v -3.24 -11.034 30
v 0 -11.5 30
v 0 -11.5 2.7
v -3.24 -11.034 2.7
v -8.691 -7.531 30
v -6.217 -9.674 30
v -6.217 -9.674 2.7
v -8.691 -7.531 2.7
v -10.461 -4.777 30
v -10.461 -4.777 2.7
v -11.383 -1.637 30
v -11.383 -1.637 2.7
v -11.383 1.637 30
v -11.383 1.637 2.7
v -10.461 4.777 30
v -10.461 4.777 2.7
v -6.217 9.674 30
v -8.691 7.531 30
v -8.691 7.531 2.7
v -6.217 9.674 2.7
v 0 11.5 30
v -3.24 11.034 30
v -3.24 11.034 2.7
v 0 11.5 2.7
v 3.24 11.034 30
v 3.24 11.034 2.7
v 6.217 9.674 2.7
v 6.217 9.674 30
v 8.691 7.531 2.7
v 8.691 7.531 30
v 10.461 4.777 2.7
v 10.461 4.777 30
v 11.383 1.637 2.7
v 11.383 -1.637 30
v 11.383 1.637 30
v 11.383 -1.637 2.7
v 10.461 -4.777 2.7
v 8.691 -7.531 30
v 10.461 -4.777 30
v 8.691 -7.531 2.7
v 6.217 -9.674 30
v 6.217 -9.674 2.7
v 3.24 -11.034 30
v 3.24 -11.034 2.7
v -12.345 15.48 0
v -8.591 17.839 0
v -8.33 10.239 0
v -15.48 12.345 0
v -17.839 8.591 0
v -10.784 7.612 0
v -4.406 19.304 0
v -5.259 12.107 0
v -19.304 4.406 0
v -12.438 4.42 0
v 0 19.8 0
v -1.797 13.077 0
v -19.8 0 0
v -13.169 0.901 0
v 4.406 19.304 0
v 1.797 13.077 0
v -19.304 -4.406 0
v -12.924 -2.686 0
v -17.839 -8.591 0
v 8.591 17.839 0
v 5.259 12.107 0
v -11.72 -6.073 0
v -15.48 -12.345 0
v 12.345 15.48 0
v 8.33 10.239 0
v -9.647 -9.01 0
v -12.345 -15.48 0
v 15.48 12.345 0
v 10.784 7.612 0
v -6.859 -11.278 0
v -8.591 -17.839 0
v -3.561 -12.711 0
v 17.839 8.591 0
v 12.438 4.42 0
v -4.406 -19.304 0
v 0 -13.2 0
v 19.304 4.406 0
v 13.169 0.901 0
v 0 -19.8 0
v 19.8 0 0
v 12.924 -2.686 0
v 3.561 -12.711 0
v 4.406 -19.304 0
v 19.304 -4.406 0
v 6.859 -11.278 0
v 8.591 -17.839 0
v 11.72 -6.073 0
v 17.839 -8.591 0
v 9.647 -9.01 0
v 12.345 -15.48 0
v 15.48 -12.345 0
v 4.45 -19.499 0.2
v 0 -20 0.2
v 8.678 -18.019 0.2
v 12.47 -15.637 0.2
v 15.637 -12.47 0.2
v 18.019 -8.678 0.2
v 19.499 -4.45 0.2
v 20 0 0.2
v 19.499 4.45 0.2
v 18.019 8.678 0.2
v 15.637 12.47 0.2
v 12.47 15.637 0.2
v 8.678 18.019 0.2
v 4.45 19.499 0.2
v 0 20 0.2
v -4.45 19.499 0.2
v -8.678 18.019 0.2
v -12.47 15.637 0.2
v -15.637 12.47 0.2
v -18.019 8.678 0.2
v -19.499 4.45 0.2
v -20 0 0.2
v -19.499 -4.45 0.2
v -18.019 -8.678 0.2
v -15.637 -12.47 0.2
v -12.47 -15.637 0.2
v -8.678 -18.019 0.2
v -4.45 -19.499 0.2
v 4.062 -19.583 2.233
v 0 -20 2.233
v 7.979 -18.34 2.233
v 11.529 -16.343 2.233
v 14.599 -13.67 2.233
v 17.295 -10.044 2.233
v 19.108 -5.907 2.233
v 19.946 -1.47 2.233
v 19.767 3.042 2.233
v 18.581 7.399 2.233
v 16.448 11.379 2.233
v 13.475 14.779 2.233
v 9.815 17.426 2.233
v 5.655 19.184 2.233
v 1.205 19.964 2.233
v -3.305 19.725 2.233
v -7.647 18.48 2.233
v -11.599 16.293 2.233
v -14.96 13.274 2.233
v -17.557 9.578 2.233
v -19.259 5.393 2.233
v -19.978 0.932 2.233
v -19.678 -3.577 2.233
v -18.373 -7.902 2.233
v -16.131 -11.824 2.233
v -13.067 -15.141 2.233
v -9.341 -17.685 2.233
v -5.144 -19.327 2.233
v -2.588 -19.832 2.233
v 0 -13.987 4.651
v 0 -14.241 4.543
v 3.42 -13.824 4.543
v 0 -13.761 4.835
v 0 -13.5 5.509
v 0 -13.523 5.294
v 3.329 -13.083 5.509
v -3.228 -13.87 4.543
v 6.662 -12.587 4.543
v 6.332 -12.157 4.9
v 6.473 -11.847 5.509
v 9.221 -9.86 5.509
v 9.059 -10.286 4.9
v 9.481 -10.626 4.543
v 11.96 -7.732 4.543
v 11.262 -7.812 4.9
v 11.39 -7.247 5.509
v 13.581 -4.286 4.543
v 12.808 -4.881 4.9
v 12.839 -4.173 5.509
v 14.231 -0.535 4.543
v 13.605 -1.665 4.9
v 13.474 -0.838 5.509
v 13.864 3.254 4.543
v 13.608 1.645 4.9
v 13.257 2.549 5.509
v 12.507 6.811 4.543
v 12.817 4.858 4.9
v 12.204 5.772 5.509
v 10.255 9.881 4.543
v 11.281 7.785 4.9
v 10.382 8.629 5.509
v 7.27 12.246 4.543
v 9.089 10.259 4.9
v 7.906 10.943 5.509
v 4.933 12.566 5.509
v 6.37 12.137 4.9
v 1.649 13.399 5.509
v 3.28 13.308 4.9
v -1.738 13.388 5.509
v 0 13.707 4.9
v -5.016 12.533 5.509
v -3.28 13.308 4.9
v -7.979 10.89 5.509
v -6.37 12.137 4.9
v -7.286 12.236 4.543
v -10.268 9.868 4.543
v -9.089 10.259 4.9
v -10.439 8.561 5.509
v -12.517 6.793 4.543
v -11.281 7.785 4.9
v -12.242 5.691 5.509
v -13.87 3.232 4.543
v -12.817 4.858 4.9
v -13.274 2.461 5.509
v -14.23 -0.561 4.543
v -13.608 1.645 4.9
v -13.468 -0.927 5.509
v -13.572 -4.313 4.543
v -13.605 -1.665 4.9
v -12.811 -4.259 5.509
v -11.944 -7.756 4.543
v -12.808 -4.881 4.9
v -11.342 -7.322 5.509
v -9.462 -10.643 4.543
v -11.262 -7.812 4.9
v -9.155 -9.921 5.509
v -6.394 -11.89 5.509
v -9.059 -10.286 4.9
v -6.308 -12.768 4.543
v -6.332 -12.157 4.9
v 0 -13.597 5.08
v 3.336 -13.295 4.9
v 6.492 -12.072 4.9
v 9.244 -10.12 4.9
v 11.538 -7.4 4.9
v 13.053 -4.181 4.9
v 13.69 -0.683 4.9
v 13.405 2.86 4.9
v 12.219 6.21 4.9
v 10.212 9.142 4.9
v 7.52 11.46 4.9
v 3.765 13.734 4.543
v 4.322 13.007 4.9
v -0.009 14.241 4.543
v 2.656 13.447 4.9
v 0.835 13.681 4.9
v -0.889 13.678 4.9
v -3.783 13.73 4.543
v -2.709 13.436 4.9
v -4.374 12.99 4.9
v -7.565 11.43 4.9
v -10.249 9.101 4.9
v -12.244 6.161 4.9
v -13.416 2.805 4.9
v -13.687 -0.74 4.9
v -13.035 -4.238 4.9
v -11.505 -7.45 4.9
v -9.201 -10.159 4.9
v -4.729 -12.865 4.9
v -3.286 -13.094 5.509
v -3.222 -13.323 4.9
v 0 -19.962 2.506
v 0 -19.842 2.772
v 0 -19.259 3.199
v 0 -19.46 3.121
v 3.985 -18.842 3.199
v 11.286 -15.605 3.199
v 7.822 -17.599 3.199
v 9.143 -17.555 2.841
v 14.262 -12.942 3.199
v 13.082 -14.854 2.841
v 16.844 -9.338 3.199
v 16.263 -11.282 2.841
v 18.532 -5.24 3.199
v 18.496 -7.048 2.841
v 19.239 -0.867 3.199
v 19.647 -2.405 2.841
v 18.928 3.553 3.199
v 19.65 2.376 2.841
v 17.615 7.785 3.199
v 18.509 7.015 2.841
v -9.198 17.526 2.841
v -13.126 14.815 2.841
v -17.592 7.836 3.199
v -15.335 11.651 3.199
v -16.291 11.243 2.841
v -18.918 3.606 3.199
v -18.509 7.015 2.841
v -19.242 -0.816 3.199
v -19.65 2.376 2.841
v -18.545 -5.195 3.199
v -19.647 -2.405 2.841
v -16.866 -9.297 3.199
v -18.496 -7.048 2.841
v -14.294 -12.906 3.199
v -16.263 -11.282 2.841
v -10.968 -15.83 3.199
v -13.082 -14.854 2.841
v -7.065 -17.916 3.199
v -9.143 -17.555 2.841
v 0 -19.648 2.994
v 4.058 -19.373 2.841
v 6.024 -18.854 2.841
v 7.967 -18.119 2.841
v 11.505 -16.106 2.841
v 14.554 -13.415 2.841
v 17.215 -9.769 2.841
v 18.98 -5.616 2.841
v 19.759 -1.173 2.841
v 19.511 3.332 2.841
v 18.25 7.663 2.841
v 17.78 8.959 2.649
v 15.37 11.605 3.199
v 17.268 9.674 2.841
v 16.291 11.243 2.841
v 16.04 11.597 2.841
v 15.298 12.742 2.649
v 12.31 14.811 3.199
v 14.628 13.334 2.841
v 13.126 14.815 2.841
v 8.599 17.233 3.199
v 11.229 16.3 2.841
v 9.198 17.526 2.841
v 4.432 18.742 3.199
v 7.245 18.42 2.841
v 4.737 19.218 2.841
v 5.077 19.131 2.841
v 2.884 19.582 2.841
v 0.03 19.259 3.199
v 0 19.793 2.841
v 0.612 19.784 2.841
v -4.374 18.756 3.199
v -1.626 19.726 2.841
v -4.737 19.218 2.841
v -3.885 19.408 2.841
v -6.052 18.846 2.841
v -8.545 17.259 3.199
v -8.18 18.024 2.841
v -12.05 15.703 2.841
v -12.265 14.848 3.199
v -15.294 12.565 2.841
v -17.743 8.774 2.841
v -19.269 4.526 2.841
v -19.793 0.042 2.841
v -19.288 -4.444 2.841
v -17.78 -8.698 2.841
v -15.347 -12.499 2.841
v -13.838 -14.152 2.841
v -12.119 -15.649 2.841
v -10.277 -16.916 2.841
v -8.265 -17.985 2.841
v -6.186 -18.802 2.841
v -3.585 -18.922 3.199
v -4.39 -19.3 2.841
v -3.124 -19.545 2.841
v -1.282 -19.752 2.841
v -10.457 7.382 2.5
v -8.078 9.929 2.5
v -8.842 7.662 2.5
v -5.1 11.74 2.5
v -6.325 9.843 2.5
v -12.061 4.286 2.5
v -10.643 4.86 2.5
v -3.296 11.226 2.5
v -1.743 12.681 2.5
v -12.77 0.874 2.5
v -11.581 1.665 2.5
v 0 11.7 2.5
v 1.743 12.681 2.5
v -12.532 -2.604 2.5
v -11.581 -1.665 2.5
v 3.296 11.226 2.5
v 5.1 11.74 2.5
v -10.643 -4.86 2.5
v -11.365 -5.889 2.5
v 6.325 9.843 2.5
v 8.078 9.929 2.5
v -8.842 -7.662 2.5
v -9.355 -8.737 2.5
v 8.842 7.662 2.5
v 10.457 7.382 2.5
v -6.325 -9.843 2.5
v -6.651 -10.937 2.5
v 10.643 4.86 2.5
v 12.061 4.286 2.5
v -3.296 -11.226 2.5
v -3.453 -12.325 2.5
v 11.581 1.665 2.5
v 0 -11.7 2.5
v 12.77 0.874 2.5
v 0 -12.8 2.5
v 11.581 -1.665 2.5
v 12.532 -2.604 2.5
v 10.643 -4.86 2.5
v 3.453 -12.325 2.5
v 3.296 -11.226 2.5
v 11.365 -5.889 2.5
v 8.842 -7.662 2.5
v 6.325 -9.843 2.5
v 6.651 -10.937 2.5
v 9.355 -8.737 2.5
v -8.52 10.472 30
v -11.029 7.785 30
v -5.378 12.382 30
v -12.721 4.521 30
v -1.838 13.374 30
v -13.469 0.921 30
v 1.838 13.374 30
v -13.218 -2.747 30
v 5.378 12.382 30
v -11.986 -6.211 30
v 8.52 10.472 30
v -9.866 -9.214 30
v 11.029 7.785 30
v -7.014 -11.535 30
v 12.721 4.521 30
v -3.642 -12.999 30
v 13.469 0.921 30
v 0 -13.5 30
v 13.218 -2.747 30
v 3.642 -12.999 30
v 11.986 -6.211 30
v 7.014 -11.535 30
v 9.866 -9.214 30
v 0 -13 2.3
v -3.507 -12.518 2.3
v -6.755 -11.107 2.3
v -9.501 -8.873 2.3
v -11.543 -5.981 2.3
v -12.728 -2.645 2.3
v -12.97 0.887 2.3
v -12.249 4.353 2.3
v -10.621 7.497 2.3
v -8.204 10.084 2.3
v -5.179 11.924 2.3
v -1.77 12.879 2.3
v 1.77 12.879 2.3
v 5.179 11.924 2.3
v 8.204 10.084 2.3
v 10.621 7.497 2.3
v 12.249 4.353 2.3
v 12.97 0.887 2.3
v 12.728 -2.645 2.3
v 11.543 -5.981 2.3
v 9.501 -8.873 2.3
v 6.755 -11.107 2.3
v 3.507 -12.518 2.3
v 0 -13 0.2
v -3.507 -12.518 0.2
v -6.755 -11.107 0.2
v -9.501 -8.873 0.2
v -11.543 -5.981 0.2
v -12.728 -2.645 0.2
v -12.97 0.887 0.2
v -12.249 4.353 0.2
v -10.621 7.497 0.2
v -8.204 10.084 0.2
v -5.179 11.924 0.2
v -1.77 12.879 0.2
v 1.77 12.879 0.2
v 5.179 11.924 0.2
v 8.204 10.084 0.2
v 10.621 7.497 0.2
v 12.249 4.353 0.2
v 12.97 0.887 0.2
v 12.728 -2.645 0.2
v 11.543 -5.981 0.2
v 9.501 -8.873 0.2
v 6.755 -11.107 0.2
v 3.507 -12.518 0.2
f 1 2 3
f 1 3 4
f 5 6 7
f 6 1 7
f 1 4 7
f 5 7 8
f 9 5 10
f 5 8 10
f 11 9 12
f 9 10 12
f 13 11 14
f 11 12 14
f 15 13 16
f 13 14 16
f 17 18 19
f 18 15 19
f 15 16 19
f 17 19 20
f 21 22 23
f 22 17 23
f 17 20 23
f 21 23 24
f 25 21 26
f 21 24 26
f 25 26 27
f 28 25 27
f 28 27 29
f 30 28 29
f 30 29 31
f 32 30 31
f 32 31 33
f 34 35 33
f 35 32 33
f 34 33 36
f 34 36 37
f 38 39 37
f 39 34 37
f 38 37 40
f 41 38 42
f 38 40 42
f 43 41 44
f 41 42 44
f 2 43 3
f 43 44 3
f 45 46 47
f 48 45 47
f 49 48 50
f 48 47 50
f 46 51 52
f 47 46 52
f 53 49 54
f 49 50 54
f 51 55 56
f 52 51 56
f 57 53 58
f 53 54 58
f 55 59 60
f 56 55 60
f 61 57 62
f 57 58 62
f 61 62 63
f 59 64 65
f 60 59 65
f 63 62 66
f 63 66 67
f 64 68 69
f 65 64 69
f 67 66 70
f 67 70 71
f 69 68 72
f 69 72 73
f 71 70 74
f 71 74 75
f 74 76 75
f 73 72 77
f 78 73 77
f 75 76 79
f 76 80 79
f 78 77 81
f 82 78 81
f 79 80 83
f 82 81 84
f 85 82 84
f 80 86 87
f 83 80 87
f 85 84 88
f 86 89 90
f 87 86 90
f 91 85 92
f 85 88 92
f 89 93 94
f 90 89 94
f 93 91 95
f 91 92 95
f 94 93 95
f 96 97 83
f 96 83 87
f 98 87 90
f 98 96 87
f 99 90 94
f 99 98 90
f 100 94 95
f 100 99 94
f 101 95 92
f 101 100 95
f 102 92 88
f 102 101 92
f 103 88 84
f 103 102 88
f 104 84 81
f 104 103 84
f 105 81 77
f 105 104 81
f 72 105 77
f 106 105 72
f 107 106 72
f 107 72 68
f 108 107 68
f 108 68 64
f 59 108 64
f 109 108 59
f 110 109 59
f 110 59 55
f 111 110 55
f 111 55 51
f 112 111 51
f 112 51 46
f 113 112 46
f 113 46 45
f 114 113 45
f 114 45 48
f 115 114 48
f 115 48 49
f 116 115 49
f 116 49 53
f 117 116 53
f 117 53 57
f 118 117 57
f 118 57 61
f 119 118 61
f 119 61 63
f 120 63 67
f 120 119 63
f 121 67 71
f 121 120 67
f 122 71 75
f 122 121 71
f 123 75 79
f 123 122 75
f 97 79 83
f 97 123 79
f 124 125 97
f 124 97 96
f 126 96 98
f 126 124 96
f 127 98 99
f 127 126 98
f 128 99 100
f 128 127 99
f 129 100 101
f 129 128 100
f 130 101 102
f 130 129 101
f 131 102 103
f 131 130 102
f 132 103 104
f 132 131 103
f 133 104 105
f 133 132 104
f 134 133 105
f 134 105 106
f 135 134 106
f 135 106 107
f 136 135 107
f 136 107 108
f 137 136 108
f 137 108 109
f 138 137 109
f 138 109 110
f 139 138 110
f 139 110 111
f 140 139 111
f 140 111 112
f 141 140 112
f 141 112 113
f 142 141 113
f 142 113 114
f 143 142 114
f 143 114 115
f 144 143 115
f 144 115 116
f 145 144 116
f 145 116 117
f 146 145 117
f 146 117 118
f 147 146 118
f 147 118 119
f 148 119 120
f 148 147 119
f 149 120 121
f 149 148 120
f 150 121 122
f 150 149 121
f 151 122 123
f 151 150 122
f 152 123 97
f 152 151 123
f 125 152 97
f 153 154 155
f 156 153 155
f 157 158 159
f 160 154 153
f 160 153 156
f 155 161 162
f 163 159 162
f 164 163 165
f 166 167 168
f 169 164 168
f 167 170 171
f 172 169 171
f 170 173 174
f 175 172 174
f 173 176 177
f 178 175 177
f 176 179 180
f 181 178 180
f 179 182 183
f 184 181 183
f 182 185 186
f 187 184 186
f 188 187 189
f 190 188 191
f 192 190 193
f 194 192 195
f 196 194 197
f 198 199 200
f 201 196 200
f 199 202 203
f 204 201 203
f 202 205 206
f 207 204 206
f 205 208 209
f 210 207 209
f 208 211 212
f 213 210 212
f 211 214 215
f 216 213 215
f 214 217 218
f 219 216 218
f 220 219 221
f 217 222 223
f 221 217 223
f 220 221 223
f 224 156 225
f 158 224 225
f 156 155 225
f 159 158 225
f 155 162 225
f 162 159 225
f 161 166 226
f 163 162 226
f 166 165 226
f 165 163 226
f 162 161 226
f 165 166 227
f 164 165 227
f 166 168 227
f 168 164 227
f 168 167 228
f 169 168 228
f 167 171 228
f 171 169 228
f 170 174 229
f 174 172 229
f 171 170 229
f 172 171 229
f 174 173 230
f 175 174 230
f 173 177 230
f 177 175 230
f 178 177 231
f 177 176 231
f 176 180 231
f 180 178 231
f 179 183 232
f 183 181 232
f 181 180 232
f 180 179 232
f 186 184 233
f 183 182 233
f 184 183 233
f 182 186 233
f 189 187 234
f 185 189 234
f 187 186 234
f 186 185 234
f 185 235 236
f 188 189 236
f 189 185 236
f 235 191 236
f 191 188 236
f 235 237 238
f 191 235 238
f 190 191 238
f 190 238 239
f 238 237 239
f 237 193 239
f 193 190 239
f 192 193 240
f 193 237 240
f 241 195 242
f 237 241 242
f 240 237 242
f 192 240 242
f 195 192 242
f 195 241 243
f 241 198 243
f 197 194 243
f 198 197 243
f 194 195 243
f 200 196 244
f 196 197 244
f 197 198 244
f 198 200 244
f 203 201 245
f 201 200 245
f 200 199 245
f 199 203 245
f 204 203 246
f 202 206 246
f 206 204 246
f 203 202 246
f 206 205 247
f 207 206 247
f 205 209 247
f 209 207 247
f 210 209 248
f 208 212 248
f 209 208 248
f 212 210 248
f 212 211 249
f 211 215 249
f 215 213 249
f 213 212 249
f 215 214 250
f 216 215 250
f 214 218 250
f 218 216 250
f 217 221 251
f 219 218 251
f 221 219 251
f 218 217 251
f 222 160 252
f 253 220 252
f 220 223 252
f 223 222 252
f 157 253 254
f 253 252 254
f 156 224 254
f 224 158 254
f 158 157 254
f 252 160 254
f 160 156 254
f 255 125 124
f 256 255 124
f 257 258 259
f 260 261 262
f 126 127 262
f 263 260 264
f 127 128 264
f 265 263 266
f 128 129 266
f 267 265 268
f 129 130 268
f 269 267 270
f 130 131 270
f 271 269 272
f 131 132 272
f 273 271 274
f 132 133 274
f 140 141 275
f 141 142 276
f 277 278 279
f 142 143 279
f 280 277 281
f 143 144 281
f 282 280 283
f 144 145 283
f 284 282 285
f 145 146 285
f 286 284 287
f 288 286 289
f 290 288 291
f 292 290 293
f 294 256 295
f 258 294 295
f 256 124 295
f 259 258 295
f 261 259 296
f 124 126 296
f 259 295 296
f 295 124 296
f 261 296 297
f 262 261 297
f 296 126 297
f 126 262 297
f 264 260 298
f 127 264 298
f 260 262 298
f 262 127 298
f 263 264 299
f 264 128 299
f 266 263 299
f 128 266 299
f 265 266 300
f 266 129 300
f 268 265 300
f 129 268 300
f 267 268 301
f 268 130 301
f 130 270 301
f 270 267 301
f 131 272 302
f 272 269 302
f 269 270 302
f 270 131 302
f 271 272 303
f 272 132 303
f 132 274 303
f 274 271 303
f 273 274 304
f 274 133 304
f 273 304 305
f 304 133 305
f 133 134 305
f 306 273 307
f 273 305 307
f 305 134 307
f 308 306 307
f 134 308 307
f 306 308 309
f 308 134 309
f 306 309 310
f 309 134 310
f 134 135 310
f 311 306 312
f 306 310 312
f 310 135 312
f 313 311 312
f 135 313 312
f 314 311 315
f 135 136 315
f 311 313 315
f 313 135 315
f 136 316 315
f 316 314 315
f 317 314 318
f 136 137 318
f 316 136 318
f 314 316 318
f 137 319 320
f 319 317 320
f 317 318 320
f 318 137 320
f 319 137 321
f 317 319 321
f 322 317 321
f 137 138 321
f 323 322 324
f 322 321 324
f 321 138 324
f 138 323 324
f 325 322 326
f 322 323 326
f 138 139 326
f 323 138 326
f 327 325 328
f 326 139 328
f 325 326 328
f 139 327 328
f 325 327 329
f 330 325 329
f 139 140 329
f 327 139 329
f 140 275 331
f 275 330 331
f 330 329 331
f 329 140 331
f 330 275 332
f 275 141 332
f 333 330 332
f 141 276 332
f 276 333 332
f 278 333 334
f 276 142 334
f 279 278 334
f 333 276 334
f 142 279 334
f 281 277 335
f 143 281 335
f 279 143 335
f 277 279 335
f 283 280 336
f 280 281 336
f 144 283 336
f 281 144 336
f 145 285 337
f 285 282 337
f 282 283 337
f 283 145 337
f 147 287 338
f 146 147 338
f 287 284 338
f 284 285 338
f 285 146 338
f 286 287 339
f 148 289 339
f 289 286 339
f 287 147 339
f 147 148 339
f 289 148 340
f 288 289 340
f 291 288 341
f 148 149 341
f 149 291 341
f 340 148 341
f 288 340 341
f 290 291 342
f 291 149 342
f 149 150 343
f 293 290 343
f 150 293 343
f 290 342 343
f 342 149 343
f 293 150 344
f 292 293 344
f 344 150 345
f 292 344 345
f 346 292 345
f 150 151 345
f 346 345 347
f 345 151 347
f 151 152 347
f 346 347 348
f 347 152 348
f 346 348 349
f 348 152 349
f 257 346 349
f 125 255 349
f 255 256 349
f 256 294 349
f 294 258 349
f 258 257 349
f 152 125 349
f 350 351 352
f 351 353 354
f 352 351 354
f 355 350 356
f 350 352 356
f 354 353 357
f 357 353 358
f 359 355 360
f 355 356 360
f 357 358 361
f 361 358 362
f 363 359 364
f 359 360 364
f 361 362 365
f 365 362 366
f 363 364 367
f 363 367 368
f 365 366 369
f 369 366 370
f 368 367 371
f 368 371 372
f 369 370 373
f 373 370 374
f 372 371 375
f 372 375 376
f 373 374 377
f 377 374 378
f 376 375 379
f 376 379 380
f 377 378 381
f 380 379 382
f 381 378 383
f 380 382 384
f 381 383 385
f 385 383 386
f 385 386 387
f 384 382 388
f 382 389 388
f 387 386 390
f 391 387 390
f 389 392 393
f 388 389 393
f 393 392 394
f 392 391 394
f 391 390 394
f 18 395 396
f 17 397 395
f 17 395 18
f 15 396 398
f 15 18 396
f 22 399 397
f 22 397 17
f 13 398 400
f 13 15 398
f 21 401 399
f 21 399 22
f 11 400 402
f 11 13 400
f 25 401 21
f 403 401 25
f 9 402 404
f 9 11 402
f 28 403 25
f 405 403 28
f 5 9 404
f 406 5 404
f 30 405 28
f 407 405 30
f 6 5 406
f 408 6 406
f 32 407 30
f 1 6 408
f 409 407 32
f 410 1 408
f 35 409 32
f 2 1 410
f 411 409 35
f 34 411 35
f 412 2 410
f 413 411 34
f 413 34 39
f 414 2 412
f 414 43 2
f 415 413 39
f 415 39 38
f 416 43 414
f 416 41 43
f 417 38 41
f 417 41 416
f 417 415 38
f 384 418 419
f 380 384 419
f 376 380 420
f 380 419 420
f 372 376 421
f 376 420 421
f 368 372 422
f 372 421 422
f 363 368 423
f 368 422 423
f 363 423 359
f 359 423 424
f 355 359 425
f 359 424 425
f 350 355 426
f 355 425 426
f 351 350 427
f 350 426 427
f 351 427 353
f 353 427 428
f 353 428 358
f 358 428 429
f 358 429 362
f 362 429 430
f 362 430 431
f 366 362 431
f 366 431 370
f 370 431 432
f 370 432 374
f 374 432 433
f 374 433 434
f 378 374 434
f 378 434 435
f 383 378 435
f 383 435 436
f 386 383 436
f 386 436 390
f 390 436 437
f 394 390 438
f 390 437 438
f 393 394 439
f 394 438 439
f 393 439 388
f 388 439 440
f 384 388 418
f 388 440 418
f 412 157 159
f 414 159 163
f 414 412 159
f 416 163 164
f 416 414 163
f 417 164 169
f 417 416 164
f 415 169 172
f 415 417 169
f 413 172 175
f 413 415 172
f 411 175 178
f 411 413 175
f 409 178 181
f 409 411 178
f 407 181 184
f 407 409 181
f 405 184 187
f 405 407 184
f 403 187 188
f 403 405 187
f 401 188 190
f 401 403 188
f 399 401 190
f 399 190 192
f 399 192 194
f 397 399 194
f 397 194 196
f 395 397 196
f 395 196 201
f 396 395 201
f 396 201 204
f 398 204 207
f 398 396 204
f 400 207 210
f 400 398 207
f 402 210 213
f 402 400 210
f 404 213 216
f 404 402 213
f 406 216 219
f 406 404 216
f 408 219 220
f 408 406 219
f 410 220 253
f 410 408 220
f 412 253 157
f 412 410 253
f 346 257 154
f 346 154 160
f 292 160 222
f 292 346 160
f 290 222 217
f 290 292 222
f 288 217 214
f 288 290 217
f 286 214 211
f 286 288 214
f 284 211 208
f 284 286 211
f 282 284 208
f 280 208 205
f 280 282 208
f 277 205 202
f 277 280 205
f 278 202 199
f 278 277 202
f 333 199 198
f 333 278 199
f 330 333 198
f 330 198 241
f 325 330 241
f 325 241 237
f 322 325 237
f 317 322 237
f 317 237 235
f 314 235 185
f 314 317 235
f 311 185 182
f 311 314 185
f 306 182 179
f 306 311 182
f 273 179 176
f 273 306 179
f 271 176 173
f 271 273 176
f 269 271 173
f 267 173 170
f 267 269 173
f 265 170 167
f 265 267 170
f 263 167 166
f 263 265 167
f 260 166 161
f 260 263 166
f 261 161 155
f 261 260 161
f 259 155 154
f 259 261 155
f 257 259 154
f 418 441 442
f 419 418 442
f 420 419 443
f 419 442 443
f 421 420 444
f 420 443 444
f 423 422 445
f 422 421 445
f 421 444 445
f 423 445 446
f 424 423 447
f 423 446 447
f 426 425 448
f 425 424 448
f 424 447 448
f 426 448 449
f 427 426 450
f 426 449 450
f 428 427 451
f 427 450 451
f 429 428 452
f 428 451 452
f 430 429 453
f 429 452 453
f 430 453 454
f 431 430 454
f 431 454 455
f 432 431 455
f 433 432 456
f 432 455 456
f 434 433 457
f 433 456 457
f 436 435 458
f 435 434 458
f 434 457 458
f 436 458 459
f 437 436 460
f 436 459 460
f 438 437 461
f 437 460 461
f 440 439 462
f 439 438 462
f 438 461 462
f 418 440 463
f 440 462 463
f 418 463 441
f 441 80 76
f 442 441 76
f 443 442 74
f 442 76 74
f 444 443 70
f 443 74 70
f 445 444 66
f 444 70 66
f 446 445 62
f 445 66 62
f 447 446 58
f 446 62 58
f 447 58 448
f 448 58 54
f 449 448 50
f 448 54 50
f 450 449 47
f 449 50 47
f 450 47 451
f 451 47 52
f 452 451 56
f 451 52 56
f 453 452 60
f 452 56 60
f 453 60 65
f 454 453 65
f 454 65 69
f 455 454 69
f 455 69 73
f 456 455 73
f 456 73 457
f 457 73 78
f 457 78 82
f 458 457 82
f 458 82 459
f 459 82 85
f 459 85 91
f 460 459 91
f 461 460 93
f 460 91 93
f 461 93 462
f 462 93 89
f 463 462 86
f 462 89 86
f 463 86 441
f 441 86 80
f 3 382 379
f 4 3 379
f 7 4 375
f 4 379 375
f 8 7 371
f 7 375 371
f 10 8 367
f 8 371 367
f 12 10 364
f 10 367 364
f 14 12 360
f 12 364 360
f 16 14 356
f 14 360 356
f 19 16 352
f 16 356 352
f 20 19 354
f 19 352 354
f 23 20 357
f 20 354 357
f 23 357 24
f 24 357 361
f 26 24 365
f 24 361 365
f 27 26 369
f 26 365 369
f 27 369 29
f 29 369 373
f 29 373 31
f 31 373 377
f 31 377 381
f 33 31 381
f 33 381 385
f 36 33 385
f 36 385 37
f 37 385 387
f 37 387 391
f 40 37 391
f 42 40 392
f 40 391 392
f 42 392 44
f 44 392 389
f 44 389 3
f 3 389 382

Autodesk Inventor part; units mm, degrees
ref_plane "YZ Plane" through (0, 0, 0) normal (1, 0, 0) x (0, 1, 0)
ref_plane "XZ Plane" through (0, 0, 0) normal (0, 1, 0) x (-1, 0, 0)
ref_plane "XY Plane" through (0, 0, 0) normal (0, 0, 1) x (1, 0, 0)
sketch "Sketch1" plane through (0, 0, 0) normal (1, 0, 0) x (0, 1, 0)
  line L0 (0, 0) -> (0, 30)
  line L1 (-11.5, 30) -> (-11.5, 2.5)
  line L2 (-11.5, 2.5) -> (-13, 2.5)
  line L3 (-13, 2.5) -> (-13, 0)
  line L4 (-13, 0) -> (-20, 0)
  line L5 (-20, 0) -> (-20, 3)
  line L6 (-20, 3) -> (-13.5, 4.7417)
  line L7 (-13.5, 4.7417) -> (-13.5, 30)
  line L8 (-13.5, 30) -> (-11.5, 30)
  dimension "d0" = 30
  dimension "d1" = 27
  dimension "d2" = 26
  dimension "d3" = 2.5
  dimension "d4" = 23
  dimension "d5" = 15
  dimension "d6" = 3
  dimension "d7" = 40
revolve "Revolution1" add sketch "Sketch1" angle 360 about axis through (0, 0, 0) along (0, 0, 1)
fillet "Fillet1" radius 1 2 edges at (0, 20, 3) (0, 13.5, 4.7417)
chamfer "Chamfer1" distance 0.2 angle 45 4 edges at (0, 20, 0) (0, 13, 0) (0, 11.5, 2.5) (0, 13, 2.5)
properties part number "nw-25-welded-30" material "Stainless Steel"
